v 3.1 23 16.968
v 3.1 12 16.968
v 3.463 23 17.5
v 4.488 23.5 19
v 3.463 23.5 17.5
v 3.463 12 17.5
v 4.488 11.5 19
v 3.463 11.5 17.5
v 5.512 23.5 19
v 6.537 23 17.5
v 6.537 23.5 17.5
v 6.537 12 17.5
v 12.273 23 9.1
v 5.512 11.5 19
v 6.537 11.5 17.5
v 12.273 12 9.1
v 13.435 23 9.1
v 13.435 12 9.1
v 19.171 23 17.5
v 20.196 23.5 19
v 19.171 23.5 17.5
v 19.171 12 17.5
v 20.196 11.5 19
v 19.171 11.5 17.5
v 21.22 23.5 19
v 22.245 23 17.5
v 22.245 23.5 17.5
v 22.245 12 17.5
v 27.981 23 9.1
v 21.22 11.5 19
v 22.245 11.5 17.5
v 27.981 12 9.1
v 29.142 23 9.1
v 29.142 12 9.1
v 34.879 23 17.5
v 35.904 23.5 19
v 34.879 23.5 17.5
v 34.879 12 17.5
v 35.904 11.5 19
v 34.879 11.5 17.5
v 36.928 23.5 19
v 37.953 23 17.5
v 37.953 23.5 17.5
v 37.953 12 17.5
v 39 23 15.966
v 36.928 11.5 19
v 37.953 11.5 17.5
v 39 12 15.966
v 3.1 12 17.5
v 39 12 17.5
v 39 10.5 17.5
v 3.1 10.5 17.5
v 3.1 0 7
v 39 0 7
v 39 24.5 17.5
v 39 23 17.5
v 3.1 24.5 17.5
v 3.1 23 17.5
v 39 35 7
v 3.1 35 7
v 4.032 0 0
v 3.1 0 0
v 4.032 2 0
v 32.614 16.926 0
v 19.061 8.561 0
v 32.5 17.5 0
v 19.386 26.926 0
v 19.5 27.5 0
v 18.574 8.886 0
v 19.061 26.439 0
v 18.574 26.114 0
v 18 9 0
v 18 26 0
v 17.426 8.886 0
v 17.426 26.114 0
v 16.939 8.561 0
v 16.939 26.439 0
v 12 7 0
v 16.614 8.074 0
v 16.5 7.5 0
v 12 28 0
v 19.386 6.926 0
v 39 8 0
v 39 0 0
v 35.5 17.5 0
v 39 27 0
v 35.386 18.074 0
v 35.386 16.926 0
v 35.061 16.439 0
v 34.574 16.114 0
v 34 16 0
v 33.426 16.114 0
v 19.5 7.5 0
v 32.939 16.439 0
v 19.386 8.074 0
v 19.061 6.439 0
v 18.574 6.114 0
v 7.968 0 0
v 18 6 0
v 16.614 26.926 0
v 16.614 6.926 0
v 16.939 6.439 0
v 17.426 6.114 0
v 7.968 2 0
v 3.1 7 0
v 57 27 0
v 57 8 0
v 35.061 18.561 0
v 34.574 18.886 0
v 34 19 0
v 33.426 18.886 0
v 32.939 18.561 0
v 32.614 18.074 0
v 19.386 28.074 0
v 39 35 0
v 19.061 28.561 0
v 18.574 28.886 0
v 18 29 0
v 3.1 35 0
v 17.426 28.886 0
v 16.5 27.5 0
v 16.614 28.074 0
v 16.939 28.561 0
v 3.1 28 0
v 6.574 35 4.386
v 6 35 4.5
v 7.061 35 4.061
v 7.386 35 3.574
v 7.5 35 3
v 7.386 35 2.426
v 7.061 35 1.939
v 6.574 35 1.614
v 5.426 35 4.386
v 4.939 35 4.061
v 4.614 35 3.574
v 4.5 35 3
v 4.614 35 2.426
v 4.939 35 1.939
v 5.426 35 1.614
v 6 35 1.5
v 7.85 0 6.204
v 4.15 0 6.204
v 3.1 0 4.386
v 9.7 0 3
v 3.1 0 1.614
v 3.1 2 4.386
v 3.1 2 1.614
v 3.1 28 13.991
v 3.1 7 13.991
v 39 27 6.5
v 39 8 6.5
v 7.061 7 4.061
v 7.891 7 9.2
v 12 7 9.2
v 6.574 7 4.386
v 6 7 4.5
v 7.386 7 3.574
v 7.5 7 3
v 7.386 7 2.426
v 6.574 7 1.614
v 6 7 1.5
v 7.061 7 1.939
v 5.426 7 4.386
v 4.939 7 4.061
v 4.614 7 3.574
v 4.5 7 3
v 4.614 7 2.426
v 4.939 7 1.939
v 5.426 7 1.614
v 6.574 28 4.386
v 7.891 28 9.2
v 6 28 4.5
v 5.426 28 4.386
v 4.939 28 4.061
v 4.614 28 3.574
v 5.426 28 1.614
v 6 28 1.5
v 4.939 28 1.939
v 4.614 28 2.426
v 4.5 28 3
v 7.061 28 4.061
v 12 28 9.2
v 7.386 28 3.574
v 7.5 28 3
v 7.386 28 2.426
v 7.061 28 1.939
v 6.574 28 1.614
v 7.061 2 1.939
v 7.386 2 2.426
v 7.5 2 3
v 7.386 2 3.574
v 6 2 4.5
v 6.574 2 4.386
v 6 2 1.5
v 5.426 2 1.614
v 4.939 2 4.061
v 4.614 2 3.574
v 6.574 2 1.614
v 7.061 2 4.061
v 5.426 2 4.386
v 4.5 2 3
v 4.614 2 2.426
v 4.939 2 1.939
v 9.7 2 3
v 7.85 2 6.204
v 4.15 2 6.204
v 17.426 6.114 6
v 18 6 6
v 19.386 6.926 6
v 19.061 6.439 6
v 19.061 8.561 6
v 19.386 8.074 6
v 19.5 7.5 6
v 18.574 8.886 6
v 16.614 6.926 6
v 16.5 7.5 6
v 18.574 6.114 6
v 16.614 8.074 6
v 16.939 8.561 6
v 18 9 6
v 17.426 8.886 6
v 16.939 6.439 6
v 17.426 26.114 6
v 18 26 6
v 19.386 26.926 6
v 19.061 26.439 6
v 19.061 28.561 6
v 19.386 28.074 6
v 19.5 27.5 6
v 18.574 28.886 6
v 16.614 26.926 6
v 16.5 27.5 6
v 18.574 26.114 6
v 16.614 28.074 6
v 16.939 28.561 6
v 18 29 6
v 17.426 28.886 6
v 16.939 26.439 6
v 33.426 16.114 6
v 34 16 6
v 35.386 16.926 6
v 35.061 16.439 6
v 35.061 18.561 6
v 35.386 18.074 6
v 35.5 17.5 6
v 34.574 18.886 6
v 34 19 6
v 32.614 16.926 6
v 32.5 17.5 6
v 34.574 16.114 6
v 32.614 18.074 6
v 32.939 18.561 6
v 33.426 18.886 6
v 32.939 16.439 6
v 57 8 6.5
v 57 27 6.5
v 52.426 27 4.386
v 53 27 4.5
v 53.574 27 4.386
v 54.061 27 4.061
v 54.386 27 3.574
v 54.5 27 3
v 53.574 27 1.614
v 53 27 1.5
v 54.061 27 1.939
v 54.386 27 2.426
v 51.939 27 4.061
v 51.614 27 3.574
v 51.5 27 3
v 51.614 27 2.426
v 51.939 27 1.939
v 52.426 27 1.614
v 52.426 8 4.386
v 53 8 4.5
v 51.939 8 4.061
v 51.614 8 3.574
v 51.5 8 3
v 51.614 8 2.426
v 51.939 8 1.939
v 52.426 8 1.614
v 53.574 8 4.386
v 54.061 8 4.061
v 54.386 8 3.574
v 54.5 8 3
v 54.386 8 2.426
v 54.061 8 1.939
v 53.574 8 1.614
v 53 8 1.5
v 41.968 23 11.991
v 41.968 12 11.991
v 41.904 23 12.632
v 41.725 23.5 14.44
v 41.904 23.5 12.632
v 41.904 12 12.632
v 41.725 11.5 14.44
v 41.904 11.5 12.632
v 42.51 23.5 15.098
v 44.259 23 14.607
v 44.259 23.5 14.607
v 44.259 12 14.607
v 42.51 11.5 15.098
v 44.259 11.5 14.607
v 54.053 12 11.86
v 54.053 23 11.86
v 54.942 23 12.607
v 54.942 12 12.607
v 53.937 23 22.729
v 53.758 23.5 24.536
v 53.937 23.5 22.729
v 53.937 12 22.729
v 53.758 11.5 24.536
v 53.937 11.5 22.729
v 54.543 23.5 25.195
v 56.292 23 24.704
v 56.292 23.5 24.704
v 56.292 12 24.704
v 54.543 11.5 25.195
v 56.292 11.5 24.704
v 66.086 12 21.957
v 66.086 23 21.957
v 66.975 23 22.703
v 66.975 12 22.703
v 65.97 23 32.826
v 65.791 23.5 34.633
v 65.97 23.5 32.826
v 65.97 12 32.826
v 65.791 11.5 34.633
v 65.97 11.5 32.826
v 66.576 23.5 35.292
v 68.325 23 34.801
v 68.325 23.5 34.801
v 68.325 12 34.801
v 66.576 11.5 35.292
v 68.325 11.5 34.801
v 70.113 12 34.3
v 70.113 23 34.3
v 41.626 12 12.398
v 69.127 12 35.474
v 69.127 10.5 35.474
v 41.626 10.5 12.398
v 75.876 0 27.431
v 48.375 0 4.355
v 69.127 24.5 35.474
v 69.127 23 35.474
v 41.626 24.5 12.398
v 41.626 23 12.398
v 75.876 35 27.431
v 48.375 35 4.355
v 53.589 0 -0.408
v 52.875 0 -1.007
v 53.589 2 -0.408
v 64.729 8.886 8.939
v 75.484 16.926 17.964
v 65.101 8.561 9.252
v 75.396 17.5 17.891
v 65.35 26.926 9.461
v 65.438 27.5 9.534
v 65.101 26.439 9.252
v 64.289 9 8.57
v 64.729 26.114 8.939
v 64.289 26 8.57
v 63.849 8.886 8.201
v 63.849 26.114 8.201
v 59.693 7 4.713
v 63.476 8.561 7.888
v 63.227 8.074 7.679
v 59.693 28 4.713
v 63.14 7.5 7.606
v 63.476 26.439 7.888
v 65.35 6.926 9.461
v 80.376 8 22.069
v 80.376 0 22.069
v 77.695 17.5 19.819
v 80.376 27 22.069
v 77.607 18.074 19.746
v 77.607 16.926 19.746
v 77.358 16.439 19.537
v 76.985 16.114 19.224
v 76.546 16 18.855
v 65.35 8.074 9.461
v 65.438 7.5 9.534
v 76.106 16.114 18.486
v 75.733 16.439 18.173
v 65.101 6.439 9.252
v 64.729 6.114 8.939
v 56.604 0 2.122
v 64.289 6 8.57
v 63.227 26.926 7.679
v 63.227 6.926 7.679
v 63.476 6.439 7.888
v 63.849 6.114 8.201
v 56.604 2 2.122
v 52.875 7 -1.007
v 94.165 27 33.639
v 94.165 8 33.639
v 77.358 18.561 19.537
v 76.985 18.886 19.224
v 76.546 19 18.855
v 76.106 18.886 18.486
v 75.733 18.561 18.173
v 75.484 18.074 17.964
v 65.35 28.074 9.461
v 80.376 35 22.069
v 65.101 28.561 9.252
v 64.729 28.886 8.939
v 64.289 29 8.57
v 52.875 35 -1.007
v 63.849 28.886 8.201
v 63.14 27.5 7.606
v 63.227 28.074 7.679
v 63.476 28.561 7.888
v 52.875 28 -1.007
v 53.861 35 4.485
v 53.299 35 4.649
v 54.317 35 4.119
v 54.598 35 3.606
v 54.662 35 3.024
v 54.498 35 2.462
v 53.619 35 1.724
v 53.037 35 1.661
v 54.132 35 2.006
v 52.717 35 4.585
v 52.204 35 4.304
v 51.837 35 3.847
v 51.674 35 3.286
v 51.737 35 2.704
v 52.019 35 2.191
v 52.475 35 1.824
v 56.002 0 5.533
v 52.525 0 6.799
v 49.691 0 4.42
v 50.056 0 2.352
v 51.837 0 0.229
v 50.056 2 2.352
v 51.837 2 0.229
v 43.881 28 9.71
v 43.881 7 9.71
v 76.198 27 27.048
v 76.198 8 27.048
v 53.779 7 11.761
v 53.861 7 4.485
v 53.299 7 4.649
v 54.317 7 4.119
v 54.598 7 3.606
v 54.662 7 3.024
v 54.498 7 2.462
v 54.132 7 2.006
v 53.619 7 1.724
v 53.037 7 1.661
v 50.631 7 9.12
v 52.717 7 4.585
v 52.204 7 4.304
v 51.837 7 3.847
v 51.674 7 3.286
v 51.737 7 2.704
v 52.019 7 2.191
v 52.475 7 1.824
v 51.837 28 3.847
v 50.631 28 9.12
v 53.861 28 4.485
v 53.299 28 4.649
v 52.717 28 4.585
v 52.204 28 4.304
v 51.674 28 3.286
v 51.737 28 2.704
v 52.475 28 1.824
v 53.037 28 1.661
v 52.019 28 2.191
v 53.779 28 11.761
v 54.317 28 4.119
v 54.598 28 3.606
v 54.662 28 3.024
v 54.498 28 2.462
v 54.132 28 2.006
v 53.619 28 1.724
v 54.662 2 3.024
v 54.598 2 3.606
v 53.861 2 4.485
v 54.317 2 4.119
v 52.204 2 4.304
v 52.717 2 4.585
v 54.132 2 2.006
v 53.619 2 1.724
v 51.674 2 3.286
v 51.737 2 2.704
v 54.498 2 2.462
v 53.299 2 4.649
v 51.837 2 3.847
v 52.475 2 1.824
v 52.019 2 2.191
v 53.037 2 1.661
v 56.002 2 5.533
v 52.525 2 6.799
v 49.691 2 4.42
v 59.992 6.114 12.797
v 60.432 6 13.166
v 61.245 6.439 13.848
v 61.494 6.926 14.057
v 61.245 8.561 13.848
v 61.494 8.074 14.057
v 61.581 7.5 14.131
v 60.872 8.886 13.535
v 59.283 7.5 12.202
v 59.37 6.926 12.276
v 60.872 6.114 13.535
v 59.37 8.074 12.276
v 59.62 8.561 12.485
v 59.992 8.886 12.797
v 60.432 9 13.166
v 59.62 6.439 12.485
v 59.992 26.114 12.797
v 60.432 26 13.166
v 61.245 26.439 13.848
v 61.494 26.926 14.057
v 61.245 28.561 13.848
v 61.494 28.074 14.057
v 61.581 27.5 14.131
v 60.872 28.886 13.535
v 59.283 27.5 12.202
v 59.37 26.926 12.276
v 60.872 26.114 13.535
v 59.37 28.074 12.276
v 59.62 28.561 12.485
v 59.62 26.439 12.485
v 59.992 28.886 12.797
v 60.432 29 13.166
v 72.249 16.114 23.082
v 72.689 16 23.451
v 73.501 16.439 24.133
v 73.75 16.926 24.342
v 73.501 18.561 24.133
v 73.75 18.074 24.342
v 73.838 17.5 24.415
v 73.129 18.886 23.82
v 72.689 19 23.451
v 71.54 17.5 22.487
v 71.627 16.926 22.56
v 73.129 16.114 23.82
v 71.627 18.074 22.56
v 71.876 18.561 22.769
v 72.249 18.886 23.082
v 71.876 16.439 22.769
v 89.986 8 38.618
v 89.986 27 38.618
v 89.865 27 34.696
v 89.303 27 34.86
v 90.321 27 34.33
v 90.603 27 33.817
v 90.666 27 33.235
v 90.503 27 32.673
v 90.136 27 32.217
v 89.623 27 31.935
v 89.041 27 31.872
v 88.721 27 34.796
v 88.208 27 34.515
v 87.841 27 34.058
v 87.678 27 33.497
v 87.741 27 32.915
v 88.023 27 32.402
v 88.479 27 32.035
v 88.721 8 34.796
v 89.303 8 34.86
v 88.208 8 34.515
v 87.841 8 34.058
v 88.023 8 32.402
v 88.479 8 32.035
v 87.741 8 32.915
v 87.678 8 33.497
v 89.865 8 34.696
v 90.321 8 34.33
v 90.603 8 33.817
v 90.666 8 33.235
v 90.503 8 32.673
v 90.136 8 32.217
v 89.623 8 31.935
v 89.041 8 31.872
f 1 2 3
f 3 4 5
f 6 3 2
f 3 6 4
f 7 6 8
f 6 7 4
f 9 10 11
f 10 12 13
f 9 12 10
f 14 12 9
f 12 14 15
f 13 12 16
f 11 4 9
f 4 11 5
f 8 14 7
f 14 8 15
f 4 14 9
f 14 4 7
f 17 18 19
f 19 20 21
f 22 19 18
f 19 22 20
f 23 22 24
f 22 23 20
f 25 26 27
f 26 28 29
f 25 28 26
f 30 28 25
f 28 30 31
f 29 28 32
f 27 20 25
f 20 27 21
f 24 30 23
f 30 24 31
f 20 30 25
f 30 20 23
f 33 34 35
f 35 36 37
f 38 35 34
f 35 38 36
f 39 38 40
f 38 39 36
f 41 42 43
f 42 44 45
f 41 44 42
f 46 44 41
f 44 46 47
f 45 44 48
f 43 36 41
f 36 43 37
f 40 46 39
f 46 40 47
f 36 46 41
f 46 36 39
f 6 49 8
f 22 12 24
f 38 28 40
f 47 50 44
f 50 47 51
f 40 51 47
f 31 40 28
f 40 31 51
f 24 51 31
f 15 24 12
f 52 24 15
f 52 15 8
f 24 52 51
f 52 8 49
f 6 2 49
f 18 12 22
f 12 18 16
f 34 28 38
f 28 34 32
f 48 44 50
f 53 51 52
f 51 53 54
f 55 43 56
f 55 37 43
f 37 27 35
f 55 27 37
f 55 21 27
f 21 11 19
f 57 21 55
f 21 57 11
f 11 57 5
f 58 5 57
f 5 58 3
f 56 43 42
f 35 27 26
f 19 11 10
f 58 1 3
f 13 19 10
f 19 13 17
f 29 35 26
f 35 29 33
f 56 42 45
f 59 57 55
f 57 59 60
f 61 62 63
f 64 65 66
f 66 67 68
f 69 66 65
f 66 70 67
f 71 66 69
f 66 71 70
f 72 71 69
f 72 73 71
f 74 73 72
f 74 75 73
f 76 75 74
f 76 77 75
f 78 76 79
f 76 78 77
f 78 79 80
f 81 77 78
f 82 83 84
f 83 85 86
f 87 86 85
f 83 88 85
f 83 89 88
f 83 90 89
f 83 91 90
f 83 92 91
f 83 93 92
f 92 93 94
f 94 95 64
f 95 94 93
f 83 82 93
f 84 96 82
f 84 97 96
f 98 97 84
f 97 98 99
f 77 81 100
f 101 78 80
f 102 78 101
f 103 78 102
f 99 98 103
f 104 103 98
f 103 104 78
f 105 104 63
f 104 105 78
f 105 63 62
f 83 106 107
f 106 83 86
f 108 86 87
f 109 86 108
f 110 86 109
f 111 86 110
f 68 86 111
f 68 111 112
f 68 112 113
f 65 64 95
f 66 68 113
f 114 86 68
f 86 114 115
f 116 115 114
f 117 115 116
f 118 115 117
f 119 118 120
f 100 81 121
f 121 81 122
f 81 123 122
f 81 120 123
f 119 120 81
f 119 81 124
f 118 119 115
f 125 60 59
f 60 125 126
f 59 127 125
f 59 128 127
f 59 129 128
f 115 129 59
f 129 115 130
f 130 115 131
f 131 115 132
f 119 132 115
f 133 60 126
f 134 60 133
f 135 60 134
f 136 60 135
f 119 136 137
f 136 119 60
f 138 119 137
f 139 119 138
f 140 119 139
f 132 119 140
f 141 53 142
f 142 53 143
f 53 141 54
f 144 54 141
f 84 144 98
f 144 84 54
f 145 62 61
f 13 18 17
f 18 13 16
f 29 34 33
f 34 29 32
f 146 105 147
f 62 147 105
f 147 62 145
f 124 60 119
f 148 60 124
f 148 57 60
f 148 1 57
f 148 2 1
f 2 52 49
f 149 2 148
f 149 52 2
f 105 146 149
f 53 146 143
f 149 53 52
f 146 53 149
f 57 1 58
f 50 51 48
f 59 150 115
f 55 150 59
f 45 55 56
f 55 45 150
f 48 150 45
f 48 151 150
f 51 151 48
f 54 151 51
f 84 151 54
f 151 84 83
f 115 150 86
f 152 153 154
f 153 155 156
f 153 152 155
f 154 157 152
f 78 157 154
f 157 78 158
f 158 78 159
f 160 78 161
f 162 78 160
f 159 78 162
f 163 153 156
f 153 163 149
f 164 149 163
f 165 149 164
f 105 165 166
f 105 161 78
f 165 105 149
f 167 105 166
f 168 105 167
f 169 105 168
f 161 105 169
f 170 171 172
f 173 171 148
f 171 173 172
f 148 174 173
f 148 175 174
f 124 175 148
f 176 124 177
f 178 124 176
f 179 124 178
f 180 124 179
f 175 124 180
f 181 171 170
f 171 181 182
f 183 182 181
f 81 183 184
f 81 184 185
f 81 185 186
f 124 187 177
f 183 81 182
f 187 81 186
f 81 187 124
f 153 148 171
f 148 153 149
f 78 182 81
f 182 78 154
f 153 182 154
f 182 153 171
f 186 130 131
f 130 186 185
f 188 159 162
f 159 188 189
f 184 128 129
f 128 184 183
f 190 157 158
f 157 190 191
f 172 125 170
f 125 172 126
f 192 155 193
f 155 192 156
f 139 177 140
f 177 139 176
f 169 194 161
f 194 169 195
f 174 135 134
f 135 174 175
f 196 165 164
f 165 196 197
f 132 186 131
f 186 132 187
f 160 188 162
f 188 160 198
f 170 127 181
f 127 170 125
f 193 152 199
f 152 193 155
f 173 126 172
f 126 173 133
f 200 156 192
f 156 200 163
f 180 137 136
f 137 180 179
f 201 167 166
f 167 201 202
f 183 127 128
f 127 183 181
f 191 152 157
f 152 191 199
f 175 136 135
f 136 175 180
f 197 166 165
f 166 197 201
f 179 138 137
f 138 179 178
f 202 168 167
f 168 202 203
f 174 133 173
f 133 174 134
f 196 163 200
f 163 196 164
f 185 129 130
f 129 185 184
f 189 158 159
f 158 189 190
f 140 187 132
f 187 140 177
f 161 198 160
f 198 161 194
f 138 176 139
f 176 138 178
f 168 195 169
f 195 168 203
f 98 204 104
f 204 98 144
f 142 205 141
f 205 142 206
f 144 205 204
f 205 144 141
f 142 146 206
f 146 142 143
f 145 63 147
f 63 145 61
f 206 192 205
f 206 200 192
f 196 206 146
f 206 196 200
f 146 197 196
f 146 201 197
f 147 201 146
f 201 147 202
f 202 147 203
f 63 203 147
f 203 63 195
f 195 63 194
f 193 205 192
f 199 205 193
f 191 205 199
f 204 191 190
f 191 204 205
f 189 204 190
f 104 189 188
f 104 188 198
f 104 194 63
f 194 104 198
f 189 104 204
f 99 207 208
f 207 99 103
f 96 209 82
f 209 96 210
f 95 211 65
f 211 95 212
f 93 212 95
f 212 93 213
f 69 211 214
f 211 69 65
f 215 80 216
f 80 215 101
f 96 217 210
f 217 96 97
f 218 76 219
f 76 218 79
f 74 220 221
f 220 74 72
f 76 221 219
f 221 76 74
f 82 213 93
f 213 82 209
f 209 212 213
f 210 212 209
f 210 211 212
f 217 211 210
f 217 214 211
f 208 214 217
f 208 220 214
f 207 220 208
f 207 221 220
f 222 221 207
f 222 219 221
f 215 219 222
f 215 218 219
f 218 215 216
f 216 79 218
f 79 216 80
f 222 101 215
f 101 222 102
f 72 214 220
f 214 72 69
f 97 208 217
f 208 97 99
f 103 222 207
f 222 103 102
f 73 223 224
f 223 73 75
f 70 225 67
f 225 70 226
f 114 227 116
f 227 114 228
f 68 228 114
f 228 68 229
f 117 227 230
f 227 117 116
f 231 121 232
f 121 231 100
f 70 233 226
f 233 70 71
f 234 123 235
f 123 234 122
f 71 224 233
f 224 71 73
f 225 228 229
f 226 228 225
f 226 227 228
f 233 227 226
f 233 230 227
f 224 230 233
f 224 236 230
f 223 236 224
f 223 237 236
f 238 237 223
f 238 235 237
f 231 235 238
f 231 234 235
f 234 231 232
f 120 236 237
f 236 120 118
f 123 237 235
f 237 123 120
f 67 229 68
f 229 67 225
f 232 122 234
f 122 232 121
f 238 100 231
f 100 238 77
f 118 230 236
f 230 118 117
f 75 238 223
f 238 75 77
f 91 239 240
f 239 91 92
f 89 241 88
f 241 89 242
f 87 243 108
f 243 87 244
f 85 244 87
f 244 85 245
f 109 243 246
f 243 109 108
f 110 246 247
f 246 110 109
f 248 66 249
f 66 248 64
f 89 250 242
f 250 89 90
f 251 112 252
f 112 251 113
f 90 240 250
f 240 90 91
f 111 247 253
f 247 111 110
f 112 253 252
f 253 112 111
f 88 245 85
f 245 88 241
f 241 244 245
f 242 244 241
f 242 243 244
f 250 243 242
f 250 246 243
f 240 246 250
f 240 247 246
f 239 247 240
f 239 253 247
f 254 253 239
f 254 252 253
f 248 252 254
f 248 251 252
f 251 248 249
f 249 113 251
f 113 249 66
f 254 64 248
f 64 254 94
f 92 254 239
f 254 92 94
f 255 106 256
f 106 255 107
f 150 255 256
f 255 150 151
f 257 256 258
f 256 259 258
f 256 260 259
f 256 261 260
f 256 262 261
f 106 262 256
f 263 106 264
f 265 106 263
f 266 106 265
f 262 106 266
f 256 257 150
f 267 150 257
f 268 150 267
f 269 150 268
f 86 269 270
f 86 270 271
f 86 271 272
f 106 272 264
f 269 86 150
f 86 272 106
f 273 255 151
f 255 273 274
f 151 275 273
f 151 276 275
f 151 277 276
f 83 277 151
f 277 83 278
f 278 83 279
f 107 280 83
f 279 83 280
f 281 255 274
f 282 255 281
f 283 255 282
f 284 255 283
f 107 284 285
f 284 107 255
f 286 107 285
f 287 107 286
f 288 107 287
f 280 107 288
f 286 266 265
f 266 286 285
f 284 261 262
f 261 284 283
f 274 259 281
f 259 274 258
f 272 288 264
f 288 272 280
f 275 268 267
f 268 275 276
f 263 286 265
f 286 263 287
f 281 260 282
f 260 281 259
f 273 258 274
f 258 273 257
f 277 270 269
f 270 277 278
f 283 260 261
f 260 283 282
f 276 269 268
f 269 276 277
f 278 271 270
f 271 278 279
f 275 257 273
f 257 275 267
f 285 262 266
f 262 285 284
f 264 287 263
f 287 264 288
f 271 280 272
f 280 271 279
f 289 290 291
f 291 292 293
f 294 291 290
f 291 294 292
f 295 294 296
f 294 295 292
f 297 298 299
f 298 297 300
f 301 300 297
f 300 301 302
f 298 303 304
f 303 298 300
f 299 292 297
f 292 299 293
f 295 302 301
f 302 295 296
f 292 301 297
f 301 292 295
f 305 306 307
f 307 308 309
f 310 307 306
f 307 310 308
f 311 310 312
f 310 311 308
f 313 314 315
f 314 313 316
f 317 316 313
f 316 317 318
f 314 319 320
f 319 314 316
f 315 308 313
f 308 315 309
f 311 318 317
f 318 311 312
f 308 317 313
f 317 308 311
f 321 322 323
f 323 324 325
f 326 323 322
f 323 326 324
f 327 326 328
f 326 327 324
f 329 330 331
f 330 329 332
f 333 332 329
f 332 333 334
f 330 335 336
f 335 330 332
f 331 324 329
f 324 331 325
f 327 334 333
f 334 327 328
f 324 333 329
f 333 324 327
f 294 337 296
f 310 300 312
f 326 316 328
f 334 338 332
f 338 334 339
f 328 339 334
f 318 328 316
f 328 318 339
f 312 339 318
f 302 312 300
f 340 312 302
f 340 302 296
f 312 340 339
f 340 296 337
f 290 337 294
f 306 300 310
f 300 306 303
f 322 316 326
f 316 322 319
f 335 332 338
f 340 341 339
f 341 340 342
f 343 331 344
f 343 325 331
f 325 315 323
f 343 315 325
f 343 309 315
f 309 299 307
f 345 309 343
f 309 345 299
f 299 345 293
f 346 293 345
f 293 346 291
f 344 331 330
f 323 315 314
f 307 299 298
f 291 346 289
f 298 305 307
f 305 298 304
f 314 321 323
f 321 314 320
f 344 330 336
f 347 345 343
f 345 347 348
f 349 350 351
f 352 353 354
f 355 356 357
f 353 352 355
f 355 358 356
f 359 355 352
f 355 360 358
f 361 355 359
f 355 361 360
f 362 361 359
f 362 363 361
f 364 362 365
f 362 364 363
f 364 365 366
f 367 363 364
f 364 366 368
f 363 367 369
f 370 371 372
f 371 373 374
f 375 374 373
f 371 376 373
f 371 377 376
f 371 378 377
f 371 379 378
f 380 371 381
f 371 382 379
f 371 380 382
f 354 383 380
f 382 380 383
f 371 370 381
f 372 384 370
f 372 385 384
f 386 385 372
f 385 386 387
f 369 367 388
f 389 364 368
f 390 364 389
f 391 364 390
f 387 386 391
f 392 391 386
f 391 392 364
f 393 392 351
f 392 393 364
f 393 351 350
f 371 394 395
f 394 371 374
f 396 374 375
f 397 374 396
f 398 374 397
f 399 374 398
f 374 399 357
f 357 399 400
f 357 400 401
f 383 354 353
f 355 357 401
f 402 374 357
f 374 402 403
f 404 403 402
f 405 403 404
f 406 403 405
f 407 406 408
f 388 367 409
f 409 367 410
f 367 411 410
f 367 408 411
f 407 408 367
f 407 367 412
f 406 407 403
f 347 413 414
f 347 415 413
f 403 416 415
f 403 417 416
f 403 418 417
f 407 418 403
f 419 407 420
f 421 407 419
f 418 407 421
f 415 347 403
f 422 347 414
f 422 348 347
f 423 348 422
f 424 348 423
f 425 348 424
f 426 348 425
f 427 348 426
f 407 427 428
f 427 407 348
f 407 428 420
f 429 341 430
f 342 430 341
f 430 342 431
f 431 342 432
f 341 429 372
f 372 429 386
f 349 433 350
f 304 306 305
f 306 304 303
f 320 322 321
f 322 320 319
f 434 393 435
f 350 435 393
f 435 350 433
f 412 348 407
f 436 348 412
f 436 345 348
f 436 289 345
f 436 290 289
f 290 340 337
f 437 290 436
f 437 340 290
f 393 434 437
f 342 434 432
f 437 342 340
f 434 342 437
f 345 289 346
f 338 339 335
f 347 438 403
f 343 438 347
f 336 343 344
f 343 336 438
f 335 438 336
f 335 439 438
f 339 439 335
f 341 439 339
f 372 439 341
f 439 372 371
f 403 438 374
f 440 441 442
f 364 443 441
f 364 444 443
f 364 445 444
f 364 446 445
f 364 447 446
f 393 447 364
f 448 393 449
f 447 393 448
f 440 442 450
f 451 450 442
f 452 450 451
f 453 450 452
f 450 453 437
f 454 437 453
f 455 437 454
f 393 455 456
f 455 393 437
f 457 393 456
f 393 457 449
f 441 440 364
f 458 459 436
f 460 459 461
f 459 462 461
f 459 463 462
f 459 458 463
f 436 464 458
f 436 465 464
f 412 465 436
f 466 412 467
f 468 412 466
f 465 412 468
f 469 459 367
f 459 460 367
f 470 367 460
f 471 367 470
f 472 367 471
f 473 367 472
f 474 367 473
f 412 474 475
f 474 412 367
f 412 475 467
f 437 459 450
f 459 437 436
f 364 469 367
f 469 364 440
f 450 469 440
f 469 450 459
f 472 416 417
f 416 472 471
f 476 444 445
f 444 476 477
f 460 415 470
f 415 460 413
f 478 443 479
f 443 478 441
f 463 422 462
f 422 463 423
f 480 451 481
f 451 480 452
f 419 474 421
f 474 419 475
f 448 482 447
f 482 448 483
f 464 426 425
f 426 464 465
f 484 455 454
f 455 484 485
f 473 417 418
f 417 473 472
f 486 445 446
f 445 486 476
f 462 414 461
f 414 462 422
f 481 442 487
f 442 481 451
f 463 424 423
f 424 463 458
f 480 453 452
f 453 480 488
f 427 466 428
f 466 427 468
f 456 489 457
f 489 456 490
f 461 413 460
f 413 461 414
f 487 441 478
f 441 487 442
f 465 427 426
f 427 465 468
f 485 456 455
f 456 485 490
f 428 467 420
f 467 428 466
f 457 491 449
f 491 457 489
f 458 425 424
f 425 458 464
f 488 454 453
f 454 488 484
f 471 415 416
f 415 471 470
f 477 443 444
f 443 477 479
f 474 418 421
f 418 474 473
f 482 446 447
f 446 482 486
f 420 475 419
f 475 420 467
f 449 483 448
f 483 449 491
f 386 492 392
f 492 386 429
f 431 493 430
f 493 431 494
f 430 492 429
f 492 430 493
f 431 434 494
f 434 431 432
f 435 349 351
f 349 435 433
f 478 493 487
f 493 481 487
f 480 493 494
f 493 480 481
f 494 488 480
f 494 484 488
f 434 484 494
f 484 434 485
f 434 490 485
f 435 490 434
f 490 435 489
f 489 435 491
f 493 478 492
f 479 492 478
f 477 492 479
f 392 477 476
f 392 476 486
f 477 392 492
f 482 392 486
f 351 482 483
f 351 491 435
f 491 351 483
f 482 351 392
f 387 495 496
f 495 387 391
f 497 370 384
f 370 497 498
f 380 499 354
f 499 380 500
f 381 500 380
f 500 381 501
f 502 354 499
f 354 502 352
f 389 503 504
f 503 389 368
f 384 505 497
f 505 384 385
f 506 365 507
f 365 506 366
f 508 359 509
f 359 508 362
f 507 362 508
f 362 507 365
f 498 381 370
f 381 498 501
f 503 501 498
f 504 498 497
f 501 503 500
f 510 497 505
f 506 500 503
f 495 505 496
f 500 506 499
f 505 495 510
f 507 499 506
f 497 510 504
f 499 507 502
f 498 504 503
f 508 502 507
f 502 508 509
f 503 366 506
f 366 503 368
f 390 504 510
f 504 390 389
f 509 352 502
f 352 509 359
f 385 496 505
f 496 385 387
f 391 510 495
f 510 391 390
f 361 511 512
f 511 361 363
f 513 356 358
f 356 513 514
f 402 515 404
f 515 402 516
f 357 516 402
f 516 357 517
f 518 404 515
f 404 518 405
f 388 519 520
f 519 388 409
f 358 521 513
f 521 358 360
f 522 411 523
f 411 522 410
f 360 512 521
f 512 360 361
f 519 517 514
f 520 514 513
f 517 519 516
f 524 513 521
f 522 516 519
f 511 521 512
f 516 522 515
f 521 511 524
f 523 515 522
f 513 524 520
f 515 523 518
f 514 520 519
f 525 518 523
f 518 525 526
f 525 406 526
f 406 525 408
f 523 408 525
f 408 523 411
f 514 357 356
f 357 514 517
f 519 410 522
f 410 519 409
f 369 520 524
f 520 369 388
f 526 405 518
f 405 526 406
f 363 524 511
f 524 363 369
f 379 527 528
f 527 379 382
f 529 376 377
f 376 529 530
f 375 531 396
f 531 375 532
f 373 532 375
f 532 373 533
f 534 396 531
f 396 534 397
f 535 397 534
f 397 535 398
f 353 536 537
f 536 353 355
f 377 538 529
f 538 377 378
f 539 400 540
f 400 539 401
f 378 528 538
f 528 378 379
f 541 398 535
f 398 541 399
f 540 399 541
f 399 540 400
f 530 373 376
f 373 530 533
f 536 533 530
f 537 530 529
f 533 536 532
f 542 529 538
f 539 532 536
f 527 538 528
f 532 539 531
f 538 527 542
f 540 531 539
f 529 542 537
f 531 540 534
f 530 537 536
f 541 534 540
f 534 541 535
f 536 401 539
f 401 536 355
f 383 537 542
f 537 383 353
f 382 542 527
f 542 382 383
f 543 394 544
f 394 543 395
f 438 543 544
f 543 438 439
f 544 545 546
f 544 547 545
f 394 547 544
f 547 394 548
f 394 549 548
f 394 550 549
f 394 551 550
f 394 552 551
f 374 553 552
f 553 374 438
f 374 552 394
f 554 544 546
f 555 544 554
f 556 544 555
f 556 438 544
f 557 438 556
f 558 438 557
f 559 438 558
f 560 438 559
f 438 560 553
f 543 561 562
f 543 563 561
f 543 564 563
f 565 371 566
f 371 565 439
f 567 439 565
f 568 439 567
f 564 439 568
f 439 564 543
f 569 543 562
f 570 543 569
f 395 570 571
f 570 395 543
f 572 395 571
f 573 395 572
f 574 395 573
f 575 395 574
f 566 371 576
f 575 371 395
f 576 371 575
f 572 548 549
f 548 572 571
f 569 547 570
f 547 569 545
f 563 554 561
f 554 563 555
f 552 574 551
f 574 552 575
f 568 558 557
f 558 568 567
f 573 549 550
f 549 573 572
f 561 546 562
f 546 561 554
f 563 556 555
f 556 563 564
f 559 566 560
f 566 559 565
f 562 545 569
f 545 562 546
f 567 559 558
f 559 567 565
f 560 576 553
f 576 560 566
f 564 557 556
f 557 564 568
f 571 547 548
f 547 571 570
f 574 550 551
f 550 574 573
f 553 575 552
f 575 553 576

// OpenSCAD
// file: track.scad
// Track piece for making a conveyor track
// you will need a minimum of 10-11 to make a working closed loop.
//
// note that this is not very parametric right now

include <configuration.scad>

$fn=16;
module track_piece(){
    x = 43;
    y = 35;
    z = 7;
    
    union(){
        difference(){
            
            union(){
               cube([x,y,z]);
               
               translate([0,y/2-6,0]) cube([x,12,z+2.1]);
                
               // cut the ends off the rack
               translate([5,y/2,z+7]) difference(){
                   rotate([90,0,0]) color([0.75,0.75,0.75]) rack(mm_per_tooth=mm_per_tooth,height=10, thickness=12, number_of_teeth=3);
                   translate([38,-10,-7]) cube(size=[10,20,5]);
                   translate([-15,-10,-7]) cube(size=[10,20,5]);
               }
               
               // bearing slides
               difference(){
                   translate([0,0,z]) cube([x,12,10.5]);
                   translate([-1,0,z]) rotate([45,0,0]) cube([x+5,15+1,10]);     
               }
               difference(){
                   translate([0,23,z]) cube([x,12,10.5]);
                   translate([-1,24,z+11]) rotate([-45,0,0]) cube([x+5,15+1,10]);     
               }

            }

            // cut a bit on both sides of material off 
            translate([-0.5,-0.1,-0.1]) cube([3.6,y+0.2,30]);
            translate([x-4,-0.1,-0.1]) cube([6.1,y+0.2,30]);
            
            // cut a bit more for higher hinge angle
            translate([9,7,3]) rotate([0,-45,0]) cube([3.6,y-14,30]);
            
            
            // cut for hinge
            translate([0,7,0]) cube([12,y-14,9.2]);
            // using a M3 bolt for hinge
            translate([6,y,3]) rotate([90,0,0]) cylinder(r=1.5, h=y+0.2);          
            translate([6,2,3]) rotate([90,0,0]) cylinder(r=3.7, h=2.1,$fn=6);   
            
            // make some holes to accept a piece that can be glued on the bottom
            translate([18,y/2-10,0]) cylinder(r=1.5, h=6);
            translate([18,y/2+10,0]) cylinder(r=1.5, h=6);
            translate([34,y/2,0]) cylinder(r=1.5, h=6);
            
        }
        // male hinge part
        translate([x-6,8,0]) difference(){
            cube([20,y-16,6.5]);
            translate([9+7,y,3]) rotate([90,0,0]) cylinder(r=1.5, h=y+0.2);
        }
        
    }    
}

// uncomment this to make your track piece stl
//track_piece();

// this one is for checking the hinge
//translate([-44-3,0,0]) track_piece();

// rack to test the distances
//translate([-10.7-mm_per_tooth*2,20,24]) rotate([-90,0,0]) color([0.75,0.75,0.75]) rack(mm_per_tooth=mm_per_tooth,height=10, thickness=12, number_of_teeth=6);

// gear
//translate([0,17.5,33]) rotate([0,90,90]) color([1.00,0.75,0.75]) gear(mm_per_tooth=mm_per_tooth,thickness=10,number_of_teeth=8,hole_diameter=5);
// file: configuration.scad
include <../../libs/publicDomainGearV1.1.scad>

// mm_per_tooth = module * PI
mm_per_tooth = 5*3.14159;
// main file
include <configuration.scad>
include <track.scad>


track_piece();
translate([50.5,0,-3]) rotate([0,-40,0]) track_piece();
